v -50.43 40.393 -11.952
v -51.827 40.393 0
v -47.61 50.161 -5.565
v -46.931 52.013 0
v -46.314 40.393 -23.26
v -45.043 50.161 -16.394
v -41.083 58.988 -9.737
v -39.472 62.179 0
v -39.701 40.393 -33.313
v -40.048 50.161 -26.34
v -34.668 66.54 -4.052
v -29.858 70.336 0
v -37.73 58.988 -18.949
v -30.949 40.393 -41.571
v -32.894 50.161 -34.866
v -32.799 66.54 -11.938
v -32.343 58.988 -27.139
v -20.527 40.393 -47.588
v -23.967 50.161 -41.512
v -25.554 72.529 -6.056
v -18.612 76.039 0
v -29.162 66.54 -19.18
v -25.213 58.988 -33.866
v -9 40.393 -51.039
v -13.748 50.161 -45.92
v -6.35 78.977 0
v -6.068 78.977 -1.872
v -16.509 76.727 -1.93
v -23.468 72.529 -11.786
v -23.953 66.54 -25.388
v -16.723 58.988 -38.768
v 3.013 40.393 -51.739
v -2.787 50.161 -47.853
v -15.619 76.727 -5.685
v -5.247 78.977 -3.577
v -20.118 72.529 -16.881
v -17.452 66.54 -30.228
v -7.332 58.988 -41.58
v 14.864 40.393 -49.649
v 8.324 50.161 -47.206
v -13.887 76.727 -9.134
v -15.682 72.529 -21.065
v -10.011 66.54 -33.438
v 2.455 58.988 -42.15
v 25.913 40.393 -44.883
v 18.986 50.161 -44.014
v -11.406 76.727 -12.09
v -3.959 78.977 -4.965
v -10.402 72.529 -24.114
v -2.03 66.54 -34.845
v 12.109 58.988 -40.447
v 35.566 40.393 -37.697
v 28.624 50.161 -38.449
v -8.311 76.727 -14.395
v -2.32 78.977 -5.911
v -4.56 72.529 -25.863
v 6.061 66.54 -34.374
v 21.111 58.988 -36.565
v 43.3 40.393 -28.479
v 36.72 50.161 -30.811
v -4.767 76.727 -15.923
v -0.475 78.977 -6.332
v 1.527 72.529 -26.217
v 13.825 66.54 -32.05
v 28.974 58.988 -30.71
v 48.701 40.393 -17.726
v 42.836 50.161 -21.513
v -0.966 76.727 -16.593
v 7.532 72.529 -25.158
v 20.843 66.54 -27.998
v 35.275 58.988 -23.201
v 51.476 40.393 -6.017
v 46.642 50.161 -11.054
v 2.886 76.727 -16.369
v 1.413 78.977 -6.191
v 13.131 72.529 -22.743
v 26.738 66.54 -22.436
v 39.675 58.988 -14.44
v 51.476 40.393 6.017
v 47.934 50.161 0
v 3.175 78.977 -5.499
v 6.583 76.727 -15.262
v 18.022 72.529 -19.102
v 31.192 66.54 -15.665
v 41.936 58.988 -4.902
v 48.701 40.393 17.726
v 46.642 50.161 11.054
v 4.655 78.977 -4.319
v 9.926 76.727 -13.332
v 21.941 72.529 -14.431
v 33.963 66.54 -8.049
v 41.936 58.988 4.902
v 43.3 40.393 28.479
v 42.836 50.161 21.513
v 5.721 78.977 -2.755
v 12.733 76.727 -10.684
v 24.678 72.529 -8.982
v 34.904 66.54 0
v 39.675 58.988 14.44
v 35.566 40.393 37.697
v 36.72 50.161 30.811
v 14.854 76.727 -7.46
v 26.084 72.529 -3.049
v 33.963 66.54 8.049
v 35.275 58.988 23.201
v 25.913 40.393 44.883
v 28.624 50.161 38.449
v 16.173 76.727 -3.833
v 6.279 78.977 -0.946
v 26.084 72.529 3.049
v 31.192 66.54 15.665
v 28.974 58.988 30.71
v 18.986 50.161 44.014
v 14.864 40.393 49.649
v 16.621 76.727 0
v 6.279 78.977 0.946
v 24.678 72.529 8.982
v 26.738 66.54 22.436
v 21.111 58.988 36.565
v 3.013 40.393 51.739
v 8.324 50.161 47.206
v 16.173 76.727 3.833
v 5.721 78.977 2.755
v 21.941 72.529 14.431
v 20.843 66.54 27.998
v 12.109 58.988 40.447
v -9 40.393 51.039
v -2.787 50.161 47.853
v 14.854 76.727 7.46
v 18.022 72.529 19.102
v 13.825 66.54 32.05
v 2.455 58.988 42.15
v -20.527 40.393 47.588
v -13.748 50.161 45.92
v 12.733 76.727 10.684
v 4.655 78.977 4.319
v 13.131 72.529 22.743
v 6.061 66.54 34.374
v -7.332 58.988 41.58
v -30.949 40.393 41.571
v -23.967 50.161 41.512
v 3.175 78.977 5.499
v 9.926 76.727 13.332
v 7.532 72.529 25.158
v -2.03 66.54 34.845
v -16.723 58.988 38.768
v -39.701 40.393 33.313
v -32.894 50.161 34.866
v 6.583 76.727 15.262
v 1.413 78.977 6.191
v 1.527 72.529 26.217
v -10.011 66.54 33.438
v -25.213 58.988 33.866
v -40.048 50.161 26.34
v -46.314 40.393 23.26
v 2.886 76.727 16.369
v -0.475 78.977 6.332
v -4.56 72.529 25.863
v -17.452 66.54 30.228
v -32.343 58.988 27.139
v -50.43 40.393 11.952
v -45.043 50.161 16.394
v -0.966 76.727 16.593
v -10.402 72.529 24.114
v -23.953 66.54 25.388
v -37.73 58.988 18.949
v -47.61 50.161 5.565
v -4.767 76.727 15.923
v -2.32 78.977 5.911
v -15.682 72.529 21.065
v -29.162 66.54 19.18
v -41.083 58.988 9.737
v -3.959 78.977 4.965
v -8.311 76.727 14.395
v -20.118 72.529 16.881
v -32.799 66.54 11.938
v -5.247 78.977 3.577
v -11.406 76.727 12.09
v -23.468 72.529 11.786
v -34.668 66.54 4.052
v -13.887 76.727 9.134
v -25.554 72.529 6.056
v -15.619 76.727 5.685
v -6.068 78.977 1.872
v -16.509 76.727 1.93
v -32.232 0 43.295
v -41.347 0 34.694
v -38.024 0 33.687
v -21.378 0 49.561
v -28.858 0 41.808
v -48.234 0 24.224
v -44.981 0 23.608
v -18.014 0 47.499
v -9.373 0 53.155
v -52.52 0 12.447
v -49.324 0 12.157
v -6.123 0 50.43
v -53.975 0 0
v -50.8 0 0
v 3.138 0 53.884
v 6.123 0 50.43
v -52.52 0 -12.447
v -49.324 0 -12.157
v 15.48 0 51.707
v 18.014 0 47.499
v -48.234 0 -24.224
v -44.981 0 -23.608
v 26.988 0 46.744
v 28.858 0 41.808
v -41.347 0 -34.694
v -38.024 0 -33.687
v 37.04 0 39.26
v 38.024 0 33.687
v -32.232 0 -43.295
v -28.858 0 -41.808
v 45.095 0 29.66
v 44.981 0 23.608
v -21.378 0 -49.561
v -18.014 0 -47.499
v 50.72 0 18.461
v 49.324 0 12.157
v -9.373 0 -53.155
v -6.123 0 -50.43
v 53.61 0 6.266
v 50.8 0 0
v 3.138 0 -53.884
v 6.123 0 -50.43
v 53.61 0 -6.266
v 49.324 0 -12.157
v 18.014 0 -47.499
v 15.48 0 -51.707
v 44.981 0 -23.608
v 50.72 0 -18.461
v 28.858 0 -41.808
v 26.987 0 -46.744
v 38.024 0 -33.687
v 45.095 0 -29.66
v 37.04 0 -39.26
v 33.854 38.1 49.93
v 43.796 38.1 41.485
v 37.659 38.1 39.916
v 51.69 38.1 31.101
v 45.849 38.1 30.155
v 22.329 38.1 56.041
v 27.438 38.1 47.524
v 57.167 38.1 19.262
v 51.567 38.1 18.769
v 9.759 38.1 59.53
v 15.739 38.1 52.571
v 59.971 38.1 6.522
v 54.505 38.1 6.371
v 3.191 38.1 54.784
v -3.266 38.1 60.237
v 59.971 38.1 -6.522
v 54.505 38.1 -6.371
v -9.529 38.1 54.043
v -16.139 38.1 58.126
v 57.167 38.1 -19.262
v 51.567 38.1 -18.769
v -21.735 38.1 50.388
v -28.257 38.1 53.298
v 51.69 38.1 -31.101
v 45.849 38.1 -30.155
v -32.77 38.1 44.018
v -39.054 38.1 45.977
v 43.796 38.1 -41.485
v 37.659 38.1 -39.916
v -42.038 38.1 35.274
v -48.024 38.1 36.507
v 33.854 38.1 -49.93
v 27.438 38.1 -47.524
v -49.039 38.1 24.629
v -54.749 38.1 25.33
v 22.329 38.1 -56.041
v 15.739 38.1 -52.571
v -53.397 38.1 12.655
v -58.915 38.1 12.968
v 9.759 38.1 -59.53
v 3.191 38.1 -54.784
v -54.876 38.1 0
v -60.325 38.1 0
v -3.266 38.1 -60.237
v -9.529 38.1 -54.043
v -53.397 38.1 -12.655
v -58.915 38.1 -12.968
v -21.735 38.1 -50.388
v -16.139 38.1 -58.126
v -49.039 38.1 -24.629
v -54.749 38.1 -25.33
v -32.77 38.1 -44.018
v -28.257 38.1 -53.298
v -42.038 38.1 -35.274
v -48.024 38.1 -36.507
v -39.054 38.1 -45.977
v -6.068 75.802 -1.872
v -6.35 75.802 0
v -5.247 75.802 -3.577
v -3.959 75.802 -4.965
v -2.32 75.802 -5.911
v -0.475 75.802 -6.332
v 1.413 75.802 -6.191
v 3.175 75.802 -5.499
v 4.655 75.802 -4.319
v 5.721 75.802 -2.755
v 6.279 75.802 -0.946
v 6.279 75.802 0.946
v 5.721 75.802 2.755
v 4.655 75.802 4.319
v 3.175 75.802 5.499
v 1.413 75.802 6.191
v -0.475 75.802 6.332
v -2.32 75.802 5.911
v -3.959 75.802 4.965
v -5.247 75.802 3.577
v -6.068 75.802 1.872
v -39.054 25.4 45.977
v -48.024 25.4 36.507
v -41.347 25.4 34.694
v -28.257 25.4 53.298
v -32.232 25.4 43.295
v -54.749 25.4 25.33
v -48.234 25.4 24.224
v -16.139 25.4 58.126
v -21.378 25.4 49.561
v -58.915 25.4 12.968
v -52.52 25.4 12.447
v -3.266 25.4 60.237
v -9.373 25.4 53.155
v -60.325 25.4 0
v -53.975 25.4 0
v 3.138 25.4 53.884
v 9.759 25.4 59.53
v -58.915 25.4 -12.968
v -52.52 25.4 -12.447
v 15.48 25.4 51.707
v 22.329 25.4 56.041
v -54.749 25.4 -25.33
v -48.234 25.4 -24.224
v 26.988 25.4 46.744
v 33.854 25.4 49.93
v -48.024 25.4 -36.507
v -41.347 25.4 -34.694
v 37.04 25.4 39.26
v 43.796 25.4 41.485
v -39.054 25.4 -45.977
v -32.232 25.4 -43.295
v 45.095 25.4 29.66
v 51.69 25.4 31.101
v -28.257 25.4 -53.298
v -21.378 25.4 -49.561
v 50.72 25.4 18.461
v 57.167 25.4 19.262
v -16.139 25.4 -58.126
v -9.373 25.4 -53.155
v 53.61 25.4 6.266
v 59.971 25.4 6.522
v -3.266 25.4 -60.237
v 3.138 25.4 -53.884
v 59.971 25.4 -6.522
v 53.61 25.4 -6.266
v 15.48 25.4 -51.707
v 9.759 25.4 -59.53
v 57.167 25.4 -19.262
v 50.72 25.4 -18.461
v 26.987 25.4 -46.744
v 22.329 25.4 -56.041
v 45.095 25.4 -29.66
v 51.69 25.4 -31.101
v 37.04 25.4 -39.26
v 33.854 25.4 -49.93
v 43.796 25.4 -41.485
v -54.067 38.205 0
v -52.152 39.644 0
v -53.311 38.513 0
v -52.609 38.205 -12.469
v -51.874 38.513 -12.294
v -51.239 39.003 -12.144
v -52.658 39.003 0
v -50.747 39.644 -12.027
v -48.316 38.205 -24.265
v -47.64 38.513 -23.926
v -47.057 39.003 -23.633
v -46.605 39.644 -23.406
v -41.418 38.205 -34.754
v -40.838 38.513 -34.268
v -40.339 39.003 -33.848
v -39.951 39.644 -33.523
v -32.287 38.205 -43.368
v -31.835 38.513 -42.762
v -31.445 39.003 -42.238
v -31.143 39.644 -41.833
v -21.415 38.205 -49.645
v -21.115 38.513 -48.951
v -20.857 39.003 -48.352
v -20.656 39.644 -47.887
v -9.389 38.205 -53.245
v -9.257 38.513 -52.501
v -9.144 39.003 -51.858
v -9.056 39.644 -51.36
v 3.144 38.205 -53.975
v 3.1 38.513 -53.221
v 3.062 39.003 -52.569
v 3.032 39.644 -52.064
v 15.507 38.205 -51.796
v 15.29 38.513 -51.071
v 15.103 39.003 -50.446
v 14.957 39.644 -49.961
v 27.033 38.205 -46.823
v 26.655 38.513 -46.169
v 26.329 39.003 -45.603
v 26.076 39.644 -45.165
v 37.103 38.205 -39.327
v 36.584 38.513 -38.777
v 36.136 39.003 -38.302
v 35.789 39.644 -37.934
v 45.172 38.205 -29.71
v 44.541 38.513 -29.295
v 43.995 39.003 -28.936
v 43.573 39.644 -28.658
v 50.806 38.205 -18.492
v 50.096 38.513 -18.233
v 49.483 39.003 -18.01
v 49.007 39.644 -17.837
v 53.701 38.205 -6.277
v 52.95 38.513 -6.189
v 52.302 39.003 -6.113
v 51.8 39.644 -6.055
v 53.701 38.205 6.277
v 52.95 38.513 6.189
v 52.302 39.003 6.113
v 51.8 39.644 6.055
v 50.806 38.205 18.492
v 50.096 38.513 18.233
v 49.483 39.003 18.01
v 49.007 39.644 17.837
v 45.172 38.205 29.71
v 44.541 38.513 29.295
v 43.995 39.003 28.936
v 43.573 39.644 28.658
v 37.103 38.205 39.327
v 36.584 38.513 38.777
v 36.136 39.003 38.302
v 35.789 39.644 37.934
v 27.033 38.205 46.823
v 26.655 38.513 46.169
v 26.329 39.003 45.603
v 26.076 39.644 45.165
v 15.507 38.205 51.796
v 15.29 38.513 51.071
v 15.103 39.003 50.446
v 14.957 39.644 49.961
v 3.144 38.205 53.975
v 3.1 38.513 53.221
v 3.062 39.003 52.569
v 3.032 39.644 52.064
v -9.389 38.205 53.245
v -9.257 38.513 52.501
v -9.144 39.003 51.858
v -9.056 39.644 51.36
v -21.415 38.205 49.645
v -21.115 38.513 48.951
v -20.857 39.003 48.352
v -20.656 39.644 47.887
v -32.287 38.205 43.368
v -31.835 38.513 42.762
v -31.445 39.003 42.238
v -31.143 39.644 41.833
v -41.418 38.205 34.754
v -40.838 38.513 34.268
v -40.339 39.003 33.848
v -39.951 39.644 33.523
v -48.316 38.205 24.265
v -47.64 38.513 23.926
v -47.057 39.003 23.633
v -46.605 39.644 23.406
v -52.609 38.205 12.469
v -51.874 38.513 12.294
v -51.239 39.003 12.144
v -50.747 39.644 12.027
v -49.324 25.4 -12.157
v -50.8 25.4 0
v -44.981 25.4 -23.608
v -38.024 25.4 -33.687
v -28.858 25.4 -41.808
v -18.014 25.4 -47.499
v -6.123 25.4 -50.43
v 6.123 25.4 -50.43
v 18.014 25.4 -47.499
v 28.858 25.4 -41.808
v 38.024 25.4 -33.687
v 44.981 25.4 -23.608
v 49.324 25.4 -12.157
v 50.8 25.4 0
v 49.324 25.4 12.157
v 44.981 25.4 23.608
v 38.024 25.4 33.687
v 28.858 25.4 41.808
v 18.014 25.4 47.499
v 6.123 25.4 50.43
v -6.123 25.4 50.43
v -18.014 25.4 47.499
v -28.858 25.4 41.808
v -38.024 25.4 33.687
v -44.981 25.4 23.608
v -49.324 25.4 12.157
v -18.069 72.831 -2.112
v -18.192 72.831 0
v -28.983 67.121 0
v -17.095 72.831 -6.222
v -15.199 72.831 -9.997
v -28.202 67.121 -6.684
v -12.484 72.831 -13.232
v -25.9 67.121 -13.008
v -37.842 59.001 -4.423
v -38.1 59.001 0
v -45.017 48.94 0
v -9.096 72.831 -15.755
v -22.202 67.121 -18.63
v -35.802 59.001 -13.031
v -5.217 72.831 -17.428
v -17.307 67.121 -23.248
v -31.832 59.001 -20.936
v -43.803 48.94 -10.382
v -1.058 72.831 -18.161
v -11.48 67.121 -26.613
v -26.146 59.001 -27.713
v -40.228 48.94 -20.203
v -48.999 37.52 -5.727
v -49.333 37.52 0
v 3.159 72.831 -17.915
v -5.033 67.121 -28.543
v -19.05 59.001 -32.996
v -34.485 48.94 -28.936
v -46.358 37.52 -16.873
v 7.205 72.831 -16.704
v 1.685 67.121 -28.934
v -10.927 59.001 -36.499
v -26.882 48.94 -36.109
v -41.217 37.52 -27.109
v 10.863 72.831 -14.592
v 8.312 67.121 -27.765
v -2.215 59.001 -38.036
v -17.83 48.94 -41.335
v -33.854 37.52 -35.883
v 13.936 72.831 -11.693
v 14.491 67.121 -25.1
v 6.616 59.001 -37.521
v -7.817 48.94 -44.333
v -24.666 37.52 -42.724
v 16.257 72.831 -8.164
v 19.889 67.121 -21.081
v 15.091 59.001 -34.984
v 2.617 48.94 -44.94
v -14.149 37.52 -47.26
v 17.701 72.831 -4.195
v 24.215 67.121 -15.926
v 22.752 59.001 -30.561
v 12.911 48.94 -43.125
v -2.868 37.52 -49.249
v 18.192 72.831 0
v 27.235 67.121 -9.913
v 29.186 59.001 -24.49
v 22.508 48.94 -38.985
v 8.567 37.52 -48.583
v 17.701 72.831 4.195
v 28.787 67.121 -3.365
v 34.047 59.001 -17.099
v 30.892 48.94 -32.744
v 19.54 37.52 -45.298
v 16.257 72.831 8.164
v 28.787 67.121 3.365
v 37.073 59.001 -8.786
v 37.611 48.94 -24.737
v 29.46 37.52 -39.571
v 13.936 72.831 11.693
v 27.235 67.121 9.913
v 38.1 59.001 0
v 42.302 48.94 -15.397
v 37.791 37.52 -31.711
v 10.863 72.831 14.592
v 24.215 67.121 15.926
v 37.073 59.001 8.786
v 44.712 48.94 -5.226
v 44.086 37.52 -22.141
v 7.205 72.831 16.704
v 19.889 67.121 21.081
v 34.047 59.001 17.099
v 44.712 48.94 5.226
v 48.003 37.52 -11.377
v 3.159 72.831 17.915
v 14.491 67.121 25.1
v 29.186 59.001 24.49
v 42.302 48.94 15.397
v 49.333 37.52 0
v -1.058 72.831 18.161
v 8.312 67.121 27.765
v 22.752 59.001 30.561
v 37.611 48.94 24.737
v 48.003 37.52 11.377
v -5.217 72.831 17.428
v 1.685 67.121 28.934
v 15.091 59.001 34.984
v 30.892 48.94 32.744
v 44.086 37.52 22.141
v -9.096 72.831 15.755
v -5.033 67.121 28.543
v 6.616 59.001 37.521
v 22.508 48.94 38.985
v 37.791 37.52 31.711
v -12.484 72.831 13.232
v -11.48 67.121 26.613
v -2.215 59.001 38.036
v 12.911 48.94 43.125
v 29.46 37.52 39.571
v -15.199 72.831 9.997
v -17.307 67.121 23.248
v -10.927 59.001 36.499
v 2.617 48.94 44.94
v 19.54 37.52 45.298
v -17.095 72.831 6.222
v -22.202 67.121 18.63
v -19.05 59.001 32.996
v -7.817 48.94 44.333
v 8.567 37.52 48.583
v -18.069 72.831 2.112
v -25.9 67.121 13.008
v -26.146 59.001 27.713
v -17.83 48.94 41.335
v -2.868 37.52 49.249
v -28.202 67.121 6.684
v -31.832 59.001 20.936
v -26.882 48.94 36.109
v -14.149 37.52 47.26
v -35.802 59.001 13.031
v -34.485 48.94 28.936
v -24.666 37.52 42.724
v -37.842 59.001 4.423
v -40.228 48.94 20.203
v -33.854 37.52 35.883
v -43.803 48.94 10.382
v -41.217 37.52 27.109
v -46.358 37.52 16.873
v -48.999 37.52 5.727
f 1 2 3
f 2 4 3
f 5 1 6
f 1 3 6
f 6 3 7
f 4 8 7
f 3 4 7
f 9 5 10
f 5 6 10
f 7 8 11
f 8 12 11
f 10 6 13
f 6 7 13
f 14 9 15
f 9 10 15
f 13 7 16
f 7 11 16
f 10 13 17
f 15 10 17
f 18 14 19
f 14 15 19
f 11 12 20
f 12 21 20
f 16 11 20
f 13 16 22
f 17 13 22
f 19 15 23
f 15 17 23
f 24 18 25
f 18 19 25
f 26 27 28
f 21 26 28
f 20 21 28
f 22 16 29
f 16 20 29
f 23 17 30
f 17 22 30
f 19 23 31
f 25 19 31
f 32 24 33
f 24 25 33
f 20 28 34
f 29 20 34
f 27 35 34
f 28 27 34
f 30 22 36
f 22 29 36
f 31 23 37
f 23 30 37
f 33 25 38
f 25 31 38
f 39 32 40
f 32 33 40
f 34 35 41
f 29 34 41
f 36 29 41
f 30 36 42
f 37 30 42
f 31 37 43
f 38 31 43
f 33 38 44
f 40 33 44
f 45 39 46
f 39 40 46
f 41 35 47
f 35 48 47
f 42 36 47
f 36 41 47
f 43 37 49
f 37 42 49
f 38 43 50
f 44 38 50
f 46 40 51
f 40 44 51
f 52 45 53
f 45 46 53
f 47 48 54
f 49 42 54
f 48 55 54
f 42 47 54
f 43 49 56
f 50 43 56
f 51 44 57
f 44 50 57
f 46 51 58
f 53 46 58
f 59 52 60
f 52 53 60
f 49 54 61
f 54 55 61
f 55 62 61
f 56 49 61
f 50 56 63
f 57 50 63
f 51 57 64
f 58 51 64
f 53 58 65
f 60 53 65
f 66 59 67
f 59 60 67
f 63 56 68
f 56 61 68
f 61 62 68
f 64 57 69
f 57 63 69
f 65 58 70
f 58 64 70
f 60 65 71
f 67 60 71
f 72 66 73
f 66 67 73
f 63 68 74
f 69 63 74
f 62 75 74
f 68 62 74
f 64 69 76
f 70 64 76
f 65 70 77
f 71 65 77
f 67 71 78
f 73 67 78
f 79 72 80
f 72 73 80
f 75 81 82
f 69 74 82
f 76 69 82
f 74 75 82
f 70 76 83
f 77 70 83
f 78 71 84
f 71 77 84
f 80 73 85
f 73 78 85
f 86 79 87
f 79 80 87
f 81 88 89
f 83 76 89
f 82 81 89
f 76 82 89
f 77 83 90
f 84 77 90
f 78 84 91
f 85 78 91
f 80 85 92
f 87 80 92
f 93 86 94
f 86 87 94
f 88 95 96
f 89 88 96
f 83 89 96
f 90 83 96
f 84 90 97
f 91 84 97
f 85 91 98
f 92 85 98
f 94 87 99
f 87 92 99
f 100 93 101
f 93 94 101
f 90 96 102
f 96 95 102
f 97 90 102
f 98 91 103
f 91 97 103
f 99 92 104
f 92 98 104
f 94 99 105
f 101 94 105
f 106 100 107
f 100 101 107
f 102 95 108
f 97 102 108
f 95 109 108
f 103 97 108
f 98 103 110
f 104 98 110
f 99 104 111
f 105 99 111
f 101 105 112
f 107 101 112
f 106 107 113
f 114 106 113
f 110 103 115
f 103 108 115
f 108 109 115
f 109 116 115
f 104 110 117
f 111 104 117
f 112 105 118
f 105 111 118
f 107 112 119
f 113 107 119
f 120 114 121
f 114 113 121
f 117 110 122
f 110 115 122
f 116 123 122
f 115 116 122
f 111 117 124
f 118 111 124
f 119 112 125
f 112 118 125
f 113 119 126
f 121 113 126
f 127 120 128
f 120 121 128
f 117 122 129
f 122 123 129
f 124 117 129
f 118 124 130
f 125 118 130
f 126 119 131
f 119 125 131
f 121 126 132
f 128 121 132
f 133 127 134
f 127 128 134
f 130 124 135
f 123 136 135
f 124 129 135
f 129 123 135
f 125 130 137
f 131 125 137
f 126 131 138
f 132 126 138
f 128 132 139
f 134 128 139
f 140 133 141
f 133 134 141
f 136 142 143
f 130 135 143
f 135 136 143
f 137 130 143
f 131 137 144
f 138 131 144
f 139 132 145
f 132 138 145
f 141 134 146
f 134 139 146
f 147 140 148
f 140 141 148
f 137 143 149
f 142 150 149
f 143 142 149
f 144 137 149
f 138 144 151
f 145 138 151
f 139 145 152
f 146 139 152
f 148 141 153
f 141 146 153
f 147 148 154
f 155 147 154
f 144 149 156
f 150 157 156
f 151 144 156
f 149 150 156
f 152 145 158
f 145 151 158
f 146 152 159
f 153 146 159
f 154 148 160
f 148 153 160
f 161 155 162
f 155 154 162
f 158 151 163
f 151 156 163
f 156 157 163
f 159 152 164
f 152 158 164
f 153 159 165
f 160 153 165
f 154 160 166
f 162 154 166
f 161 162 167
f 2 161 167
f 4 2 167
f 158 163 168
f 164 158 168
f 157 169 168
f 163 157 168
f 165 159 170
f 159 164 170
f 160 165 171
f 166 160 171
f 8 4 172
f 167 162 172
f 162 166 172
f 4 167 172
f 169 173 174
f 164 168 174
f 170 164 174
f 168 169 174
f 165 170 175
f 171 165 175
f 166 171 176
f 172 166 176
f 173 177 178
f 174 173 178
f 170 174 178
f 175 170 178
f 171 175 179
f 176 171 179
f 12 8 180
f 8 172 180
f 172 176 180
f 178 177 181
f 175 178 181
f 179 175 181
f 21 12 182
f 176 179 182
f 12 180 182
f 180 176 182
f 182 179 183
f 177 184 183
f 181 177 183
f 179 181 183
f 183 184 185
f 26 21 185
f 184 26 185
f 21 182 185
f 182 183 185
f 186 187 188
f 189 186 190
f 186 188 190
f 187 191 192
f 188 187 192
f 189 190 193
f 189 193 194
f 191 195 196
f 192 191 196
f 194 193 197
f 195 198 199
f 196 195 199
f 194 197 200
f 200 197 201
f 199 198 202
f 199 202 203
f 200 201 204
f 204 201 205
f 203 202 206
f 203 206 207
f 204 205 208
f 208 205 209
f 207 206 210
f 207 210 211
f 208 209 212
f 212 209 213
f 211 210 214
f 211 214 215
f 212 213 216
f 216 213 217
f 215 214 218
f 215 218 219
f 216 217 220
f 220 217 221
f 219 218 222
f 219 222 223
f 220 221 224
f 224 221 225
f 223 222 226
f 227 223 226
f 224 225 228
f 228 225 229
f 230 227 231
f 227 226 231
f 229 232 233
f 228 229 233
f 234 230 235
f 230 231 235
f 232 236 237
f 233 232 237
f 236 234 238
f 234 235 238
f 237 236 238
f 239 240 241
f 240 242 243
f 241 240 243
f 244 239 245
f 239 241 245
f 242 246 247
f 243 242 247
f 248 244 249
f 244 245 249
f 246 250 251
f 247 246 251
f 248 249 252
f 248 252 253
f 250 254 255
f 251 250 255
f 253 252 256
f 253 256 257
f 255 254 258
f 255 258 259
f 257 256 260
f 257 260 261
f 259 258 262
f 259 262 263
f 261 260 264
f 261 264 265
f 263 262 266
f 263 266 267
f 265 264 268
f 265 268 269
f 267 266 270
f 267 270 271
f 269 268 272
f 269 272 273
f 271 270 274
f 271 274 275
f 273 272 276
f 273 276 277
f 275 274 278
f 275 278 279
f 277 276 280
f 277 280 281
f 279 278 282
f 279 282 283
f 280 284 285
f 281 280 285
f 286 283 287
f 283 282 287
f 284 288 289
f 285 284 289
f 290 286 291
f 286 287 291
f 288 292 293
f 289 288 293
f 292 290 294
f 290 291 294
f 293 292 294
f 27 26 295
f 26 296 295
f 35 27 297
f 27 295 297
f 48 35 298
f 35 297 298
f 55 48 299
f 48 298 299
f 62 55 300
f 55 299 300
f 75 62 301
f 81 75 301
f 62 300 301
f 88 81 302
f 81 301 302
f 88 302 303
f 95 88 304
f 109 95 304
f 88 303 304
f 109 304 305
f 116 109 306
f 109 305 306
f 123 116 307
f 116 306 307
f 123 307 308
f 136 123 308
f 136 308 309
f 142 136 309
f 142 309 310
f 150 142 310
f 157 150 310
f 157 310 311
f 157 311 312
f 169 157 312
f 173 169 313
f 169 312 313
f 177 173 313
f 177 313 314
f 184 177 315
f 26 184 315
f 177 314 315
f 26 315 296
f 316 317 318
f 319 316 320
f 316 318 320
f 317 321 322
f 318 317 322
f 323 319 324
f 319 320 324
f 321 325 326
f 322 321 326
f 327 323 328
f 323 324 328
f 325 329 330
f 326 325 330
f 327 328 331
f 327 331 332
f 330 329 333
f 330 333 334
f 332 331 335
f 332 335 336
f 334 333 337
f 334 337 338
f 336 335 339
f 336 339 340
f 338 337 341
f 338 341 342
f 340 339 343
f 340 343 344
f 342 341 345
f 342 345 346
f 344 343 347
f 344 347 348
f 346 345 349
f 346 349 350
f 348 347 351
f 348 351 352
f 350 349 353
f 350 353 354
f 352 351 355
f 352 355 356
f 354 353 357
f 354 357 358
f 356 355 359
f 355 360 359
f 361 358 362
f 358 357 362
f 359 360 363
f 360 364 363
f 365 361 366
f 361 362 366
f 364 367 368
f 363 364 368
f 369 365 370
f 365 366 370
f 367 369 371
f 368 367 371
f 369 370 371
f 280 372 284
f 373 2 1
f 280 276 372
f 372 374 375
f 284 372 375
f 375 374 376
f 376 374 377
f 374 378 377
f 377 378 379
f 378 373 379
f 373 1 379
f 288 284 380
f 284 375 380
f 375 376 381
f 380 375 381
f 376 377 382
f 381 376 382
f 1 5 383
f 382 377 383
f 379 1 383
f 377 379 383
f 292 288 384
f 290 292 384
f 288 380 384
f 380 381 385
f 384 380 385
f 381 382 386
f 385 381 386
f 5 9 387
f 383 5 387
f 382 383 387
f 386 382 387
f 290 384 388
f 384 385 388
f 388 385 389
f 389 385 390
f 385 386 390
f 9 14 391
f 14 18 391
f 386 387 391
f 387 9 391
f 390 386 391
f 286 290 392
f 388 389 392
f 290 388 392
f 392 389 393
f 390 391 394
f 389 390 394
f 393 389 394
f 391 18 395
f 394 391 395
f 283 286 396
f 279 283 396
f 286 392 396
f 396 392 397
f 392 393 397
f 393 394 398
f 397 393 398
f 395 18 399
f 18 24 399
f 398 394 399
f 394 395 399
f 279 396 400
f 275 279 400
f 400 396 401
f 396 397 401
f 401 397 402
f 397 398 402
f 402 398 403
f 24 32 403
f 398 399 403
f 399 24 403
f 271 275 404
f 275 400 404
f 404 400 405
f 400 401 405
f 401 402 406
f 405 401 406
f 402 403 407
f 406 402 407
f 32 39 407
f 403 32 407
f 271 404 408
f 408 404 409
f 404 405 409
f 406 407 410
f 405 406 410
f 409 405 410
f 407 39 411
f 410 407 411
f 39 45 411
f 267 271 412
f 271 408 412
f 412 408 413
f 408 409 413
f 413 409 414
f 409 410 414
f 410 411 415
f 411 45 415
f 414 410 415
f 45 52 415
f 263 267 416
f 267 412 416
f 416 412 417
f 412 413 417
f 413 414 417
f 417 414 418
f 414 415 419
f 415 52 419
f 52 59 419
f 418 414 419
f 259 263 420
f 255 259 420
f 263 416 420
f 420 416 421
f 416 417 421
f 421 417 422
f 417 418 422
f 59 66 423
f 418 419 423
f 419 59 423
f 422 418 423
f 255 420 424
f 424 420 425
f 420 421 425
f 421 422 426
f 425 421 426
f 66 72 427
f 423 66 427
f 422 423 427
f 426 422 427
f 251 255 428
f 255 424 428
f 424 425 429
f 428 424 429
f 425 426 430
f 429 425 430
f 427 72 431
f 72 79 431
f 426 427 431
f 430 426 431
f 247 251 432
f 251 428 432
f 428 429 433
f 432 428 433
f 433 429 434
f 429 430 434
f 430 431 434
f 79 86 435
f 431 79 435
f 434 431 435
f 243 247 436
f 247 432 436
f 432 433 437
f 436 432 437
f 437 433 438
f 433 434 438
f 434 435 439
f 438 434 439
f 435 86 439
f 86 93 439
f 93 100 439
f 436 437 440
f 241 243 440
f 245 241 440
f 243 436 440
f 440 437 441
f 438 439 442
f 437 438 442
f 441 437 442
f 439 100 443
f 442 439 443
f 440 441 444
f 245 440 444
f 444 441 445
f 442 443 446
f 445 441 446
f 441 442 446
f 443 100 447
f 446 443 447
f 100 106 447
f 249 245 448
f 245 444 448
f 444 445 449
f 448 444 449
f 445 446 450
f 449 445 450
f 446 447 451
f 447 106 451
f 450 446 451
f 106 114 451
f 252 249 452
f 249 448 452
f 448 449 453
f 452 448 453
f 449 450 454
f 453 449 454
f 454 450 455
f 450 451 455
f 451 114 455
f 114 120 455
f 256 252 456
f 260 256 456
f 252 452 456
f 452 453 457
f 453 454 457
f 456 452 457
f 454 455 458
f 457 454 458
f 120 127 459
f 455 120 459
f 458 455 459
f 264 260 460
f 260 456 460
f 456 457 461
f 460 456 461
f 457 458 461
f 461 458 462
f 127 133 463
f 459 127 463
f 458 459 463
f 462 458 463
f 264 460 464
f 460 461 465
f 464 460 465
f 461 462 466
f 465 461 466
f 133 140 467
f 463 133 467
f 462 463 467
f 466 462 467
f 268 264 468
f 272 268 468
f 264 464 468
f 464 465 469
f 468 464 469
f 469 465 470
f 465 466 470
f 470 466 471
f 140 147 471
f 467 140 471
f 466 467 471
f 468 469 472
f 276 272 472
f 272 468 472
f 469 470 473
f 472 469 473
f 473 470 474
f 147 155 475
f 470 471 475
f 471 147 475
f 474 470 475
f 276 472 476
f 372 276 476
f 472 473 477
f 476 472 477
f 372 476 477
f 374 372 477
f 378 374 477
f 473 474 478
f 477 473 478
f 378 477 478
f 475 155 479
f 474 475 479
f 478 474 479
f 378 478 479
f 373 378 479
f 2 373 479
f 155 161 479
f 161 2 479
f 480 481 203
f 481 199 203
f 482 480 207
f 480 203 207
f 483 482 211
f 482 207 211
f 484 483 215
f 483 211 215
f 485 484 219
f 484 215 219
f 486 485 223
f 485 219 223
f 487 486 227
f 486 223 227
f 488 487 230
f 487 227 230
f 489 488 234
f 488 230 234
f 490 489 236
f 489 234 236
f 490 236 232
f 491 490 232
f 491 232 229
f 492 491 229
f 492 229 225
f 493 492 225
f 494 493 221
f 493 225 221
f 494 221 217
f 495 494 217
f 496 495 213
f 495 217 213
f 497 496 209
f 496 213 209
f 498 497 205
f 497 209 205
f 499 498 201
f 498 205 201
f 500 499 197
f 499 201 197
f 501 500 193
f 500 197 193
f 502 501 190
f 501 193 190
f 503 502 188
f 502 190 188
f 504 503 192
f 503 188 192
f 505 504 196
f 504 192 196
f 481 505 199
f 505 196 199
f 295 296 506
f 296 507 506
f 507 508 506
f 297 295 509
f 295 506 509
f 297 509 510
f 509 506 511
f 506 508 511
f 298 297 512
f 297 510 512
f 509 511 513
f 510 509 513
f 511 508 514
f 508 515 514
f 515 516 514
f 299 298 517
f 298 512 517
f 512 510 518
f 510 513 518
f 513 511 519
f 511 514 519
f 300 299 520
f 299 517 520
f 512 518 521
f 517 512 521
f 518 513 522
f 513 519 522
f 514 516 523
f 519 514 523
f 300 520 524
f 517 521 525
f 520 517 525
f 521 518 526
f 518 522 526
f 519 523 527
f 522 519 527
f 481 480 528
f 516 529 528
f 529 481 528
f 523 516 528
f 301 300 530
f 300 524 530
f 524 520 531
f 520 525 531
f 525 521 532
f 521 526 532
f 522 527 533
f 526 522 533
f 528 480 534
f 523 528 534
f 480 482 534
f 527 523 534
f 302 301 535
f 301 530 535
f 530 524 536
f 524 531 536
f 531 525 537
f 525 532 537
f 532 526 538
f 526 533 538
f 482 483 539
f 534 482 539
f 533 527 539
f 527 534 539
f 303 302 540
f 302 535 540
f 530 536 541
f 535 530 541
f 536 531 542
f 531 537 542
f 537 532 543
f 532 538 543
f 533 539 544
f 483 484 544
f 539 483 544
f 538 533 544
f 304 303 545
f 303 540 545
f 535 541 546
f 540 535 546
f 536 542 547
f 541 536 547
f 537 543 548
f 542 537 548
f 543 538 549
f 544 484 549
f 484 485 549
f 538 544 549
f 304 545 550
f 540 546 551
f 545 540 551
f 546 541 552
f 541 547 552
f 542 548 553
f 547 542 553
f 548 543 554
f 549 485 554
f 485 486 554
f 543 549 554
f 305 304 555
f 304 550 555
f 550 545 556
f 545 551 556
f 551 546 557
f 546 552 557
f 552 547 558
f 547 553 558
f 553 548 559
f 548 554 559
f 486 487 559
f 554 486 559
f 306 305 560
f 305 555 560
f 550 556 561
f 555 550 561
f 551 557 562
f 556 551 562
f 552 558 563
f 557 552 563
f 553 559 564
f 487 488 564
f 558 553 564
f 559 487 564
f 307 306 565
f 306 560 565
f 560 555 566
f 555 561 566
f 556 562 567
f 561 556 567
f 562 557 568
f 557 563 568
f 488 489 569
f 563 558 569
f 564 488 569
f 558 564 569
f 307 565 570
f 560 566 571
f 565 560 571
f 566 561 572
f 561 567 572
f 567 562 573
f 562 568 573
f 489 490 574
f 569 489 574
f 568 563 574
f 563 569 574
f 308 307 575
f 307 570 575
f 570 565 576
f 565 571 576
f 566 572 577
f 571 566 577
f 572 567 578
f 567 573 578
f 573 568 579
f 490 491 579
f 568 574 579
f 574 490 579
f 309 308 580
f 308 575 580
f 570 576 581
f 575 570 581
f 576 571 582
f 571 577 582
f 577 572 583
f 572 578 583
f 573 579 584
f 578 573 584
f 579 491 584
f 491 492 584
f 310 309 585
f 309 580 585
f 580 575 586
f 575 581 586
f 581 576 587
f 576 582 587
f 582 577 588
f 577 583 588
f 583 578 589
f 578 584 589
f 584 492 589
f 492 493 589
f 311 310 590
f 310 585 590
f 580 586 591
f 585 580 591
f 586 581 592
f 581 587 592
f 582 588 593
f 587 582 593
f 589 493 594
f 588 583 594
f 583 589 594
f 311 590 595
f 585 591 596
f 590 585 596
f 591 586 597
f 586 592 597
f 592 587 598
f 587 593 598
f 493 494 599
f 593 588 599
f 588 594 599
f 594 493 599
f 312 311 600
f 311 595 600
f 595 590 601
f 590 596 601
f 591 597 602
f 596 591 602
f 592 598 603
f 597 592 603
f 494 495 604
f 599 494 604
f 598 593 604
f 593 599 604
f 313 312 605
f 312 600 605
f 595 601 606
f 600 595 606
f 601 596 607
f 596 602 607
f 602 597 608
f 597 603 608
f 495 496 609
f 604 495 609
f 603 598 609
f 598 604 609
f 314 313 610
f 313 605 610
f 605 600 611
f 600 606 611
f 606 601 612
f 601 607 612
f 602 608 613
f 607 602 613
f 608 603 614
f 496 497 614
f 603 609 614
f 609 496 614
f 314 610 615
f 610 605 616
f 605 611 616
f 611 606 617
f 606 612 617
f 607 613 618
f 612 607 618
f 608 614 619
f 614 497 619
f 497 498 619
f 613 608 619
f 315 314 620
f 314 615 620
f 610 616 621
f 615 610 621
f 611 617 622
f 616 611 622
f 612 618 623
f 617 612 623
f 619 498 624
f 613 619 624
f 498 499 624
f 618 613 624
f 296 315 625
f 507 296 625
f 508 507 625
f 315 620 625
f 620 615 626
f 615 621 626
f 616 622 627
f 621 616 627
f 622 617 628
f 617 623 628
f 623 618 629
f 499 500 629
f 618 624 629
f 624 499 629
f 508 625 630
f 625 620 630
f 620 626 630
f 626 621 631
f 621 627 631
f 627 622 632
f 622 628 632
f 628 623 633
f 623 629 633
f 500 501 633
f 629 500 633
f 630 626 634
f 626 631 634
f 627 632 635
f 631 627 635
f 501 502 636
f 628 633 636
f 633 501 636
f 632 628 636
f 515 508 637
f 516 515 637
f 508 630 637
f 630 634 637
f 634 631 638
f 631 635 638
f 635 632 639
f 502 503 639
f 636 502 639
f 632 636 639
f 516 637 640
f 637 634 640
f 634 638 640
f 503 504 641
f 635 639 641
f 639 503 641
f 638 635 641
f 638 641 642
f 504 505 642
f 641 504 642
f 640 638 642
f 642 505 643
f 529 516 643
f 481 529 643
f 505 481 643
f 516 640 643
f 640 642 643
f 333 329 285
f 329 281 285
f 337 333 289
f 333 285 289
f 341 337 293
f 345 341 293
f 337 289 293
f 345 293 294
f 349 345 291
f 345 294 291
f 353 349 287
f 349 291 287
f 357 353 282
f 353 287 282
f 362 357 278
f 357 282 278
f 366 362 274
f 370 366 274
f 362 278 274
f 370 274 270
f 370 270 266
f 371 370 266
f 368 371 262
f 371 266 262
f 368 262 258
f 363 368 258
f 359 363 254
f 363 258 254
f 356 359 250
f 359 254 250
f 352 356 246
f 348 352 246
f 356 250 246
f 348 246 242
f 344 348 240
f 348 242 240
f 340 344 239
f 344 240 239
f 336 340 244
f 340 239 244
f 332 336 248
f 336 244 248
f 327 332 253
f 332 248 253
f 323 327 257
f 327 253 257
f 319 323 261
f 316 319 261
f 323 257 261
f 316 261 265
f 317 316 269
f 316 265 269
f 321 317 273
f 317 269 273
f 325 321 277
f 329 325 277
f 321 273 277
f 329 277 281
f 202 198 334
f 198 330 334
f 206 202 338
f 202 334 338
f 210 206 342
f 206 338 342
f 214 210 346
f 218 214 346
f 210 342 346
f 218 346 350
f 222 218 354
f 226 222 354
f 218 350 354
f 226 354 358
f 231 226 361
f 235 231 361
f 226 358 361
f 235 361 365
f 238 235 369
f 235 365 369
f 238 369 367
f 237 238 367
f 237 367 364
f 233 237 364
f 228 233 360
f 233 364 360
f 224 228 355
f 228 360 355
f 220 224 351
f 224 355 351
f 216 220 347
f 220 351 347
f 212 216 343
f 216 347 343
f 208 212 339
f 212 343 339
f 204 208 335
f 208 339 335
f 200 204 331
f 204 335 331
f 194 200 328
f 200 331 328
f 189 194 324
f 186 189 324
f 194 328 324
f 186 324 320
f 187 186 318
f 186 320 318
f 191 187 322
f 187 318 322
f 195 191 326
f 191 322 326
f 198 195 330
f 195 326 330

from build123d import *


with BuildPart() as part:
    # Sketch1 → Revolve7 (revolve)
    with BuildSketch(Plane.XY):
        with BuildLine():
            Line((-53.975, 0), (-53.975, 25.4))
            Line((-53.975, 25.4), (-60.325, 25.4))
            Line((-60.325, 25.4), (-60.325, 38.1))
            Line((-60.325, 38.1), (-54.876478898, 38.1))
            ThreePointArc((-54.876478898, 38.1), (-52.968691921, 38.737092624), (-51.826534557, 40.392693639))
            ThreePointArc((-51.826534557, 40.392693639), (-34.904240815, 66.539573647), (-6.35, 78.976562476))
            Line((-6.35, 78.976562476), (-6.35, 75.801562476))
            ThreePointArc((-6.35, 75.801562476), (-38.1, 59.001041651), (-50.8, 25.4))
            Line((-50.8, 25.4), (-50.8, 0))
            Line((-50.8, 0), (-53.975, 0))
        make_face()
    revolve(axis=Axis((0, 121.236821391, 0), (0, -1, 0)))


solid = part.part
